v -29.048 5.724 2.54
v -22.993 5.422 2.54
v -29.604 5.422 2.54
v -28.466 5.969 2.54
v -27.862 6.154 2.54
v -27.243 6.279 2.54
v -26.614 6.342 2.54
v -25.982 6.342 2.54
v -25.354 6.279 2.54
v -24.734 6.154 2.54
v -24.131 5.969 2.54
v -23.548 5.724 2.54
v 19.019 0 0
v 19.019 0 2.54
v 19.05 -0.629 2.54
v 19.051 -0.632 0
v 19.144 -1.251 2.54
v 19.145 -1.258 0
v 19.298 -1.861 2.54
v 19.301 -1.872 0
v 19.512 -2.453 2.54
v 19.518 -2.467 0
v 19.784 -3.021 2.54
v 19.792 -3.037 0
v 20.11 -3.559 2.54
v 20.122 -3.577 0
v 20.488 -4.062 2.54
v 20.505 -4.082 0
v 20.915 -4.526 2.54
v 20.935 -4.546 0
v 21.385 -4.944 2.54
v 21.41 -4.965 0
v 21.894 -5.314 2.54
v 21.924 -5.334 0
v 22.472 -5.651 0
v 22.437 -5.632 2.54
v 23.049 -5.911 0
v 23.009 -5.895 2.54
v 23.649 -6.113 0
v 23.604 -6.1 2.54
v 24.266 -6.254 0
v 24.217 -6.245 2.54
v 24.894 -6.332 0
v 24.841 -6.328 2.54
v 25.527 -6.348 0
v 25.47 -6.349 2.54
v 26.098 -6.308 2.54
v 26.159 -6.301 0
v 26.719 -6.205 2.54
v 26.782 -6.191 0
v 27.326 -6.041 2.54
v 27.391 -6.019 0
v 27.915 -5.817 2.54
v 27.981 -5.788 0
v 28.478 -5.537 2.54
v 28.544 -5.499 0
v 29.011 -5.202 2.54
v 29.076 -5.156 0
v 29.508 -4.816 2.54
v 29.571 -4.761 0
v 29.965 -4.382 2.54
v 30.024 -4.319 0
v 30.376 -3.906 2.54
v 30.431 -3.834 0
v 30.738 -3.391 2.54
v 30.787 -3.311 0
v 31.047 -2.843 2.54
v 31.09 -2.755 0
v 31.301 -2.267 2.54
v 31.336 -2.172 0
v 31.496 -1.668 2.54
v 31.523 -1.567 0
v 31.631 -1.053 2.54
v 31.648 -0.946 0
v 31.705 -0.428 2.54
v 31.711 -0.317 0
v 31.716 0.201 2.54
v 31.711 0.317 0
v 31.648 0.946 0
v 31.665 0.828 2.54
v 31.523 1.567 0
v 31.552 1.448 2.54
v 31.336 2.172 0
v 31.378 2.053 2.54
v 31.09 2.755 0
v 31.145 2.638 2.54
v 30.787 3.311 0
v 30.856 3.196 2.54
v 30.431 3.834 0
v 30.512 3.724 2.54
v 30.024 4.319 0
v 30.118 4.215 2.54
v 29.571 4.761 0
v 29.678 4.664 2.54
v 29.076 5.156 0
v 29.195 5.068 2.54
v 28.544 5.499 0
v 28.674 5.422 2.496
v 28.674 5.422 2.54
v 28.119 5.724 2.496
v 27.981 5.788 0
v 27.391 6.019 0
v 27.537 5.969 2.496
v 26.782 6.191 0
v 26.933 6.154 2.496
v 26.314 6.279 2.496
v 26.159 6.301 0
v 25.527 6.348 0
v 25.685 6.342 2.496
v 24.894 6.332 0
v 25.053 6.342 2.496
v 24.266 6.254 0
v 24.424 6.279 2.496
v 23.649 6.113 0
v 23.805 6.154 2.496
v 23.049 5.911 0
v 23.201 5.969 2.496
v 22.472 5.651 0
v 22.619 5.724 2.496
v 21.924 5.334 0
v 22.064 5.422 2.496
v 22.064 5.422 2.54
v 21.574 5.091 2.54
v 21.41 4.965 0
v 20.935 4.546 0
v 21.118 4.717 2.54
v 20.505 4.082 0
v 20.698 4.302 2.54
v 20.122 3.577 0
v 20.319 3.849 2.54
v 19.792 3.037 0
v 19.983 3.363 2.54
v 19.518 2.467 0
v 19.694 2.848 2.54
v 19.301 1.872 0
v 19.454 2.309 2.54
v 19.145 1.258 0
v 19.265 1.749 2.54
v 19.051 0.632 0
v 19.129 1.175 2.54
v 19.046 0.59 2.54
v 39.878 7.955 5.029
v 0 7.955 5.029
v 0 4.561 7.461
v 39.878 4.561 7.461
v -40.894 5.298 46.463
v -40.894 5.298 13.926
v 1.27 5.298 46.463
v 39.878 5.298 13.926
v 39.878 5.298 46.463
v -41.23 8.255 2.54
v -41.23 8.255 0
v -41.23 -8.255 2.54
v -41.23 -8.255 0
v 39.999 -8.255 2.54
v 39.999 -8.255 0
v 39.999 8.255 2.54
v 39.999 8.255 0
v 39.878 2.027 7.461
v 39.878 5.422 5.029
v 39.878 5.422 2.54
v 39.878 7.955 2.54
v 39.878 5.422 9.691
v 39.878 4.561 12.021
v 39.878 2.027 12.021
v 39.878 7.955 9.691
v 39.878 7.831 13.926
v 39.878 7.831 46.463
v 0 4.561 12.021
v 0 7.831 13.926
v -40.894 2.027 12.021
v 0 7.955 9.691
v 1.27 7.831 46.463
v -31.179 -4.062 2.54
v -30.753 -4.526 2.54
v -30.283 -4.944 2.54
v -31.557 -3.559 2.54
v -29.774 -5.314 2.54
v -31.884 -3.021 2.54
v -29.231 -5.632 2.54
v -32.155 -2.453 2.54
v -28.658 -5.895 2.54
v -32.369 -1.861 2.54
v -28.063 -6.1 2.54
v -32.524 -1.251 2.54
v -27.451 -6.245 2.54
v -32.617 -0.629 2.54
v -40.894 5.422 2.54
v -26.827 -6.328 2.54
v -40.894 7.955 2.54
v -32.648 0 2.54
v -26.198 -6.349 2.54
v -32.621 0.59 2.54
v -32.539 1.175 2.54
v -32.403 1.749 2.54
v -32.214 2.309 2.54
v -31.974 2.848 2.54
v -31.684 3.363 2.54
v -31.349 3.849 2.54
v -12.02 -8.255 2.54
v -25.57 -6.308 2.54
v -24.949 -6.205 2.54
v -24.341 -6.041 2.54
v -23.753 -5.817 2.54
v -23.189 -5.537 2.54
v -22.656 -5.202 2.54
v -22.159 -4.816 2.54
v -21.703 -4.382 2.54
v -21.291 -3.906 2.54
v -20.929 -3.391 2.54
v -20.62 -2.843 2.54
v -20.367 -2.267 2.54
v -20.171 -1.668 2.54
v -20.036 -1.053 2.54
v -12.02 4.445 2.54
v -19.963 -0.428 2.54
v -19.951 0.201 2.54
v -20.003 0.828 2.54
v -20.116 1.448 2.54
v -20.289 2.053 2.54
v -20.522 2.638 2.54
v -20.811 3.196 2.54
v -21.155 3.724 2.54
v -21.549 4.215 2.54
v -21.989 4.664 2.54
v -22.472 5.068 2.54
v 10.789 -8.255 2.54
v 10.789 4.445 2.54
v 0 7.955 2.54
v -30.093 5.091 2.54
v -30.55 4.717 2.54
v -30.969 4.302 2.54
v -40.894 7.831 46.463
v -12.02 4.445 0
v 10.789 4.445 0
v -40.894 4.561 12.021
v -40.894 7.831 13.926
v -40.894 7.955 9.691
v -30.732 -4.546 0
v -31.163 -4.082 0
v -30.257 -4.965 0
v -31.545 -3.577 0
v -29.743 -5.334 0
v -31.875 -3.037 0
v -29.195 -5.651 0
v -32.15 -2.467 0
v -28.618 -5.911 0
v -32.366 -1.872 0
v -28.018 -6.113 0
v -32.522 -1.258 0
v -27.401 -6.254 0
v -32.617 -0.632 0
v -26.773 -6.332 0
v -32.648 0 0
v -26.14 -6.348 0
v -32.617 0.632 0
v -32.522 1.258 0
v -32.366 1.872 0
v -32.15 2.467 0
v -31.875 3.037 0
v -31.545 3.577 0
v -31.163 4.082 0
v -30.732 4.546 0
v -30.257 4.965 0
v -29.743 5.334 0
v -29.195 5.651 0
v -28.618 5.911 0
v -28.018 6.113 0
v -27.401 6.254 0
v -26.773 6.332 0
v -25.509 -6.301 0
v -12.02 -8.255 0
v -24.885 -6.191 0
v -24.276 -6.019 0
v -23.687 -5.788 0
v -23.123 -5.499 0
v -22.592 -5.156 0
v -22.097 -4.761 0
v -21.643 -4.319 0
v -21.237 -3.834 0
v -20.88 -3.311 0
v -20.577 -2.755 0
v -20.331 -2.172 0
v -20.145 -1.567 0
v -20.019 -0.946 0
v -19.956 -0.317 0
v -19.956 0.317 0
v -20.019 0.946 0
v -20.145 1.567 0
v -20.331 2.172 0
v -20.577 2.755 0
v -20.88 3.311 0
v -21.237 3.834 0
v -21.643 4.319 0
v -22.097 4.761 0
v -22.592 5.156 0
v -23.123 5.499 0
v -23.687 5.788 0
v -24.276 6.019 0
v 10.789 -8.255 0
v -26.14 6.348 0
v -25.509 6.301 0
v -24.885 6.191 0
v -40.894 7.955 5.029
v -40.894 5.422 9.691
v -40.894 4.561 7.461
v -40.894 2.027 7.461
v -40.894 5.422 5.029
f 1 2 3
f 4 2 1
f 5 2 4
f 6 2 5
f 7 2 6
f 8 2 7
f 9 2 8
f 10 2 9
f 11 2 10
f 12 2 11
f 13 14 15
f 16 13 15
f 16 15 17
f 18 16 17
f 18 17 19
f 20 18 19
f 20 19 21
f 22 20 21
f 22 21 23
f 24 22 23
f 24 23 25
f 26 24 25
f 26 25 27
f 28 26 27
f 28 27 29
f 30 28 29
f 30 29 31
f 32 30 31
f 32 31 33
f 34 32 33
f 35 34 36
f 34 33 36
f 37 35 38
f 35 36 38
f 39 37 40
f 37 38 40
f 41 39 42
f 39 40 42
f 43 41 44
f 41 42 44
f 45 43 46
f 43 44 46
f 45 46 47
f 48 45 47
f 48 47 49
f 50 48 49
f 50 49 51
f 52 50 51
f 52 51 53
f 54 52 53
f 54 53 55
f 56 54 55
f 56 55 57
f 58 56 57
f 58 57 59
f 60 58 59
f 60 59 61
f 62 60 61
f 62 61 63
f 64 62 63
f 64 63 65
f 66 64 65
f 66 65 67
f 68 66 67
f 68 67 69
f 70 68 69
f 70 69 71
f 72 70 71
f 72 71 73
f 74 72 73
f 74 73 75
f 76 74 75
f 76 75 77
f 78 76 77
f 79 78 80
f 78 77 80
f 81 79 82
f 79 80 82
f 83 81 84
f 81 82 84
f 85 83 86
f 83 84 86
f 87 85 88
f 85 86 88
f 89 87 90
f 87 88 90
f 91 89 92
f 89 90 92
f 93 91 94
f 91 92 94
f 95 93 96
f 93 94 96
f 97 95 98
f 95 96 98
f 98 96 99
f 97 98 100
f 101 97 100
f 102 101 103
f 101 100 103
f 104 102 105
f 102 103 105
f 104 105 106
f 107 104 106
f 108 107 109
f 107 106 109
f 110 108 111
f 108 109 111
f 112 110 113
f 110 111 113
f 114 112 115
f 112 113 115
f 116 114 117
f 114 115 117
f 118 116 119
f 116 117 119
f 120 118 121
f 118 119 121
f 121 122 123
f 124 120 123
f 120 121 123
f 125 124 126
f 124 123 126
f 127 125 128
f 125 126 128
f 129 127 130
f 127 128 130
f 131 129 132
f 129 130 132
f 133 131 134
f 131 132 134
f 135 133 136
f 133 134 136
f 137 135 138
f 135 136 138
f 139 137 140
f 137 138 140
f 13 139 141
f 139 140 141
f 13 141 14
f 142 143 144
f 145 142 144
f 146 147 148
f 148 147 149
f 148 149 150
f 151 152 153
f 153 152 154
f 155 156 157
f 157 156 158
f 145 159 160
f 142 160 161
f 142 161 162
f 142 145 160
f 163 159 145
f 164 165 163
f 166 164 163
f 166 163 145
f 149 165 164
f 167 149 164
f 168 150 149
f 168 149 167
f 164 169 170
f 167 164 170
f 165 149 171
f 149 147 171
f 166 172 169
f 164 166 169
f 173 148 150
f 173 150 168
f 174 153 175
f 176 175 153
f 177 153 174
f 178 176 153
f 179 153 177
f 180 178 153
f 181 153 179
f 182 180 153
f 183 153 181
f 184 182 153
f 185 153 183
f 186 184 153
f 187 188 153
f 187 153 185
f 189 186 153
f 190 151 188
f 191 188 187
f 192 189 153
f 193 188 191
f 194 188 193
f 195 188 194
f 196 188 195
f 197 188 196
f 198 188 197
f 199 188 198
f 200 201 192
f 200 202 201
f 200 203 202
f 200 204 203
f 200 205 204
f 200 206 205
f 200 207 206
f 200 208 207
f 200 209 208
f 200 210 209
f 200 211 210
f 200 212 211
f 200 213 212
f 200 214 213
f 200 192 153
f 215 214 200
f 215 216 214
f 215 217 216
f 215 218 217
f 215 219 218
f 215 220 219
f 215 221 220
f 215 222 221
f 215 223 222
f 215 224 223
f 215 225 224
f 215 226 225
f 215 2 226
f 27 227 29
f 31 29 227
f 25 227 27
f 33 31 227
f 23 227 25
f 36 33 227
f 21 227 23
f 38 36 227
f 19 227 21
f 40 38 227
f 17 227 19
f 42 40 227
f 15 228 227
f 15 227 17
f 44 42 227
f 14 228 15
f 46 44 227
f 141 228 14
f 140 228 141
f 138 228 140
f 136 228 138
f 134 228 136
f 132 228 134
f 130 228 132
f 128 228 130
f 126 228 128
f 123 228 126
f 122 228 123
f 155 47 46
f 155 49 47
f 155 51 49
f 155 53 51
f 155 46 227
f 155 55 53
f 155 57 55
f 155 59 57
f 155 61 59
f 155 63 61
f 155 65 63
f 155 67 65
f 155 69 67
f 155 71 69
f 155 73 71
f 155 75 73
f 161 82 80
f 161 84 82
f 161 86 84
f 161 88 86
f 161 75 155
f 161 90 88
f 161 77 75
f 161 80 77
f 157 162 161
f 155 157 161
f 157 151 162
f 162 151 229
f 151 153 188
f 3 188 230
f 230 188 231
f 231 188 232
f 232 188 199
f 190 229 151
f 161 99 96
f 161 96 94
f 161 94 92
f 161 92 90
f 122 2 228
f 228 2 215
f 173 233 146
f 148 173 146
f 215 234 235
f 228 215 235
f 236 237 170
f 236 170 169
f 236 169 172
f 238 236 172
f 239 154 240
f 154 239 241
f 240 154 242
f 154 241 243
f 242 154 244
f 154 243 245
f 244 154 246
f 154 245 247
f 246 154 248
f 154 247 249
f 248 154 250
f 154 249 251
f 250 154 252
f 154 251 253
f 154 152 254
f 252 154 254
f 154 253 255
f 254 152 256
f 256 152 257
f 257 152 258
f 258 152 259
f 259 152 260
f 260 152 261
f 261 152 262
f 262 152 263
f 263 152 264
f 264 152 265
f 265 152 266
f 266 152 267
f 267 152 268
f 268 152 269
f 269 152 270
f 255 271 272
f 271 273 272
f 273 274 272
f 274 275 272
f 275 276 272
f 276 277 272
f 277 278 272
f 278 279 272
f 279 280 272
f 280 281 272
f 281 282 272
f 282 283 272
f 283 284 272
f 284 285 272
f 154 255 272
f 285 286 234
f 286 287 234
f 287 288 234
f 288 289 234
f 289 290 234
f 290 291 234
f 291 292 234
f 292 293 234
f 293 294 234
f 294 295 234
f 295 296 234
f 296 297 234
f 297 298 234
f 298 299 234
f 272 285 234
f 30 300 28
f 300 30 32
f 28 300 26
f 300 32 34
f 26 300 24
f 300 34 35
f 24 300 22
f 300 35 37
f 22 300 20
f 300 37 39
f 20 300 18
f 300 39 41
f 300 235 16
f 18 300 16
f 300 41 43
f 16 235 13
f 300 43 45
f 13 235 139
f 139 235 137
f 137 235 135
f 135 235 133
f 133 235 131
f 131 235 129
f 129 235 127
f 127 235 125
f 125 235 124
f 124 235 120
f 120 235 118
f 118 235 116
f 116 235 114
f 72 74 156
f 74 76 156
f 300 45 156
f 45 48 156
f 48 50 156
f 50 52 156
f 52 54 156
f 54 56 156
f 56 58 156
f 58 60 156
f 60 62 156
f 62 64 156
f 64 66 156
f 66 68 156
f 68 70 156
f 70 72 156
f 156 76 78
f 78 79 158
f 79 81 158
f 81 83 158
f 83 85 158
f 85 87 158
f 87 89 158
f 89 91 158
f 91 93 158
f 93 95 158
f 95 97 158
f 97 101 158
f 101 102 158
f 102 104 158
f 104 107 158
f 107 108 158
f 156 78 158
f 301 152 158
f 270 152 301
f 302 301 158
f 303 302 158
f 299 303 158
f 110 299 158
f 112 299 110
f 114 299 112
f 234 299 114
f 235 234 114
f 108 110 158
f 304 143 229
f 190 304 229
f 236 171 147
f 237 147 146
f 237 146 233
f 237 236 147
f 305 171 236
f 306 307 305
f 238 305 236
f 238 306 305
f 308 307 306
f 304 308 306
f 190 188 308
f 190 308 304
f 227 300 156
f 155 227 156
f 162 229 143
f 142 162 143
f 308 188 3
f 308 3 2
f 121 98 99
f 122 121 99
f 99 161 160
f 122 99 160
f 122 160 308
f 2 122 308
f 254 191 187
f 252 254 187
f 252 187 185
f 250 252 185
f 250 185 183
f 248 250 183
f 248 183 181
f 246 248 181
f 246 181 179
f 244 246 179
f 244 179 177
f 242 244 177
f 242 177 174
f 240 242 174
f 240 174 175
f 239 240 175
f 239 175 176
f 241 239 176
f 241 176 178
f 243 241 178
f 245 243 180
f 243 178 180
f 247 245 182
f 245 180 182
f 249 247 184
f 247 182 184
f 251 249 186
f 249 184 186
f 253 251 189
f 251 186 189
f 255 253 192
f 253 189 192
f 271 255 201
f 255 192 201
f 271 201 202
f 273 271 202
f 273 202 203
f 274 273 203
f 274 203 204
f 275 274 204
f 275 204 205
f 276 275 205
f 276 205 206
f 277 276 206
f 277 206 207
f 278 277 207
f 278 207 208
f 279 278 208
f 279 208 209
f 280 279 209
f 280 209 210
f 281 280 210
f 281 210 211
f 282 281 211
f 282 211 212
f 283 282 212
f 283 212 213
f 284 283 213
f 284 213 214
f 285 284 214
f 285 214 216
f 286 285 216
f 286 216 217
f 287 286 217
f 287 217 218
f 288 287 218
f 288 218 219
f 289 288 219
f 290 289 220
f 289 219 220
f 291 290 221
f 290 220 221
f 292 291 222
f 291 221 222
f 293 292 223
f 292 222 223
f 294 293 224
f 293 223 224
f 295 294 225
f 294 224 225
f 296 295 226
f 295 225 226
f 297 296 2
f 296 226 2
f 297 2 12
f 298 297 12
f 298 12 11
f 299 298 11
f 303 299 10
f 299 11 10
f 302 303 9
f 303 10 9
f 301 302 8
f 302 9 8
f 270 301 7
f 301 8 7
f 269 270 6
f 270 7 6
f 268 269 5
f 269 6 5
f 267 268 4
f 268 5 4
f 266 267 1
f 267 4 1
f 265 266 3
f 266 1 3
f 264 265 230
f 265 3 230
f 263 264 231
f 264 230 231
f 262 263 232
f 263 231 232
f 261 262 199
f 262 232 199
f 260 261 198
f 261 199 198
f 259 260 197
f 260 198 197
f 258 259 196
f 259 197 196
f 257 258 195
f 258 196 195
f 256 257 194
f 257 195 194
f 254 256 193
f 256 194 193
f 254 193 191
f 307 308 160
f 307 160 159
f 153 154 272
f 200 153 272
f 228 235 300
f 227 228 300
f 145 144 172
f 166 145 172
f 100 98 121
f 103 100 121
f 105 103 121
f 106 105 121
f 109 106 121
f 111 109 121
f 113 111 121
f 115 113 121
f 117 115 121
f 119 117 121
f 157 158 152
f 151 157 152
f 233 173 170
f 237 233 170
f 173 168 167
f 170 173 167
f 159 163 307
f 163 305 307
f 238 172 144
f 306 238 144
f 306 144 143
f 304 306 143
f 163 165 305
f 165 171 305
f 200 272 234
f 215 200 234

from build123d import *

# Parameters (mm, degrees)
F0_W     = 22.8092
F0_H     = 3.81
F1_DEPTH = 2.54
F3_D     = 12.7
F4_W     = 2.533436
F4_H     = 32.537733
F4_H_2   = 2.533436
F5_DEPTH = 39.878
F6_DEPTH = 40.894
F7_DEPTH = 2.54
F8_DEPTH = 1.27


with BuildPart() as f1:
    # F0 (on Top) → F1 (new body)
    with BuildSketch(Plane.XY):
        Polygon((39.999277, -8.255), (39.999277, 8.255), (10.789277, 8.255), (10.789277, 4.445), (10.789277, -8.255), align=None)
        with Locations((-0.615323, 6.35)):
            Rectangle(F0_W, F0_H)
        Polygon((-12.019923, 4.445), (-12.019923, 8.255), (-41.229923, 8.255), (-41.229923, -8.255), (-12.019923, -8.255), align=None)
    extrude(amount=F1_DEPTH)

    # F3 (through all)
    with Locations(Plane(origin=(0, 0, 0), x_dir=(1, 0, 0), z_dir=(0, 0, -1))):
        with Locations((-26.298294, 0), (25.369024, 0)):
            Hole(F3_D / 2)

    # F4 (on Right) → F5 (join)
    with BuildSketch(Plane.YZ):
        Polygon((4.560548, 12.021394), (7.831009, 13.925678), (5.297573, 13.925678), (2.027112, 12.021394), (5.421916, 9.690633), (2.027112, 7.46121), (5.421916, 5.029112), (7.955352, 5.029112), (4.560548, 7.46121), (7.955352, 9.690633), align=None)
        with Locations((6.564291, 30.194544)):
            Rectangle(F4_W, F4_H)
        with Locations((6.688634, 3.762394)):
            Rectangle(F4_W, F4_H_2)
    extrude(amount=F5_DEPTH)

    # F5_face (on face) → F6 (join)
    with BuildSketch(Plane(origin=(0, 6.250023, 24.501706), x_dir=(0, 1, 0), z_dir=(-1, 0, 0))):
        Polygon((-1.689476, 12.480312), (1.705328, 14.811073), (-1.689476, 17.040496), (1.705328, 19.472594), (1.705328, 21.961706), (-0.828107, 21.961706), (-0.828107, 19.472594), (-4.222911, 17.040496), (-0.828107, 14.811073), (-4.222911, 12.480312), (-0.95245, 10.576028), (-0.95245, -21.961706), (1.580986, -21.961706), (1.580986, 10.576028), align=None)
    extrude(amount=F6_DEPTH)

    # F6_face (on face) → F7 (join)
    with BuildSketch(Plane(origin=(-40.894, 6.250023, 24.501706), x_dir=(0, 1, 0), z_dir=(-1, 0, 0))):
        Polygon((-0.95245, 10.576028), (-0.95245, -21.961706), (1.580986, -21.961706), (1.580986, 10.576028), (-1.689476, 12.480312), (1.705328, 14.811073), (-1.689476, 17.040496), (1.705328, 19.472594), (1.705328, 21.961706), (-0.828107, 21.961706), (-0.828107, 19.472594), (-4.222911, 17.040496), (-0.828107, 14.811073), (-4.222911, 12.480312), align=None)
    extrude(amount=-F7_DEPTH)

    # F5_face (on face) → F8 (join)
    with BuildSketch(Plane(origin=(0, 6.250023, 24.501706), x_dir=(0, 1, 0), z_dir=(-1, 0, 0))):
        Polygon((1.705328, 14.811073), (-1.689476, 12.480312), (1.580986, 10.576028), (1.580986, -21.961706), (-0.95245, -21.961706), (-0.95245, 10.576028), (-4.222911, 12.480312), (-0.828107, 14.811073), (-4.222911, 17.040496), (-0.828107, 19.472594), (-0.828107, 21.961706), (1.705328, 21.961706), (1.705328, 19.472594), (-1.689476, 17.040496), align=None)
    extrude(amount=-F8_DEPTH)


solid = f1.part
